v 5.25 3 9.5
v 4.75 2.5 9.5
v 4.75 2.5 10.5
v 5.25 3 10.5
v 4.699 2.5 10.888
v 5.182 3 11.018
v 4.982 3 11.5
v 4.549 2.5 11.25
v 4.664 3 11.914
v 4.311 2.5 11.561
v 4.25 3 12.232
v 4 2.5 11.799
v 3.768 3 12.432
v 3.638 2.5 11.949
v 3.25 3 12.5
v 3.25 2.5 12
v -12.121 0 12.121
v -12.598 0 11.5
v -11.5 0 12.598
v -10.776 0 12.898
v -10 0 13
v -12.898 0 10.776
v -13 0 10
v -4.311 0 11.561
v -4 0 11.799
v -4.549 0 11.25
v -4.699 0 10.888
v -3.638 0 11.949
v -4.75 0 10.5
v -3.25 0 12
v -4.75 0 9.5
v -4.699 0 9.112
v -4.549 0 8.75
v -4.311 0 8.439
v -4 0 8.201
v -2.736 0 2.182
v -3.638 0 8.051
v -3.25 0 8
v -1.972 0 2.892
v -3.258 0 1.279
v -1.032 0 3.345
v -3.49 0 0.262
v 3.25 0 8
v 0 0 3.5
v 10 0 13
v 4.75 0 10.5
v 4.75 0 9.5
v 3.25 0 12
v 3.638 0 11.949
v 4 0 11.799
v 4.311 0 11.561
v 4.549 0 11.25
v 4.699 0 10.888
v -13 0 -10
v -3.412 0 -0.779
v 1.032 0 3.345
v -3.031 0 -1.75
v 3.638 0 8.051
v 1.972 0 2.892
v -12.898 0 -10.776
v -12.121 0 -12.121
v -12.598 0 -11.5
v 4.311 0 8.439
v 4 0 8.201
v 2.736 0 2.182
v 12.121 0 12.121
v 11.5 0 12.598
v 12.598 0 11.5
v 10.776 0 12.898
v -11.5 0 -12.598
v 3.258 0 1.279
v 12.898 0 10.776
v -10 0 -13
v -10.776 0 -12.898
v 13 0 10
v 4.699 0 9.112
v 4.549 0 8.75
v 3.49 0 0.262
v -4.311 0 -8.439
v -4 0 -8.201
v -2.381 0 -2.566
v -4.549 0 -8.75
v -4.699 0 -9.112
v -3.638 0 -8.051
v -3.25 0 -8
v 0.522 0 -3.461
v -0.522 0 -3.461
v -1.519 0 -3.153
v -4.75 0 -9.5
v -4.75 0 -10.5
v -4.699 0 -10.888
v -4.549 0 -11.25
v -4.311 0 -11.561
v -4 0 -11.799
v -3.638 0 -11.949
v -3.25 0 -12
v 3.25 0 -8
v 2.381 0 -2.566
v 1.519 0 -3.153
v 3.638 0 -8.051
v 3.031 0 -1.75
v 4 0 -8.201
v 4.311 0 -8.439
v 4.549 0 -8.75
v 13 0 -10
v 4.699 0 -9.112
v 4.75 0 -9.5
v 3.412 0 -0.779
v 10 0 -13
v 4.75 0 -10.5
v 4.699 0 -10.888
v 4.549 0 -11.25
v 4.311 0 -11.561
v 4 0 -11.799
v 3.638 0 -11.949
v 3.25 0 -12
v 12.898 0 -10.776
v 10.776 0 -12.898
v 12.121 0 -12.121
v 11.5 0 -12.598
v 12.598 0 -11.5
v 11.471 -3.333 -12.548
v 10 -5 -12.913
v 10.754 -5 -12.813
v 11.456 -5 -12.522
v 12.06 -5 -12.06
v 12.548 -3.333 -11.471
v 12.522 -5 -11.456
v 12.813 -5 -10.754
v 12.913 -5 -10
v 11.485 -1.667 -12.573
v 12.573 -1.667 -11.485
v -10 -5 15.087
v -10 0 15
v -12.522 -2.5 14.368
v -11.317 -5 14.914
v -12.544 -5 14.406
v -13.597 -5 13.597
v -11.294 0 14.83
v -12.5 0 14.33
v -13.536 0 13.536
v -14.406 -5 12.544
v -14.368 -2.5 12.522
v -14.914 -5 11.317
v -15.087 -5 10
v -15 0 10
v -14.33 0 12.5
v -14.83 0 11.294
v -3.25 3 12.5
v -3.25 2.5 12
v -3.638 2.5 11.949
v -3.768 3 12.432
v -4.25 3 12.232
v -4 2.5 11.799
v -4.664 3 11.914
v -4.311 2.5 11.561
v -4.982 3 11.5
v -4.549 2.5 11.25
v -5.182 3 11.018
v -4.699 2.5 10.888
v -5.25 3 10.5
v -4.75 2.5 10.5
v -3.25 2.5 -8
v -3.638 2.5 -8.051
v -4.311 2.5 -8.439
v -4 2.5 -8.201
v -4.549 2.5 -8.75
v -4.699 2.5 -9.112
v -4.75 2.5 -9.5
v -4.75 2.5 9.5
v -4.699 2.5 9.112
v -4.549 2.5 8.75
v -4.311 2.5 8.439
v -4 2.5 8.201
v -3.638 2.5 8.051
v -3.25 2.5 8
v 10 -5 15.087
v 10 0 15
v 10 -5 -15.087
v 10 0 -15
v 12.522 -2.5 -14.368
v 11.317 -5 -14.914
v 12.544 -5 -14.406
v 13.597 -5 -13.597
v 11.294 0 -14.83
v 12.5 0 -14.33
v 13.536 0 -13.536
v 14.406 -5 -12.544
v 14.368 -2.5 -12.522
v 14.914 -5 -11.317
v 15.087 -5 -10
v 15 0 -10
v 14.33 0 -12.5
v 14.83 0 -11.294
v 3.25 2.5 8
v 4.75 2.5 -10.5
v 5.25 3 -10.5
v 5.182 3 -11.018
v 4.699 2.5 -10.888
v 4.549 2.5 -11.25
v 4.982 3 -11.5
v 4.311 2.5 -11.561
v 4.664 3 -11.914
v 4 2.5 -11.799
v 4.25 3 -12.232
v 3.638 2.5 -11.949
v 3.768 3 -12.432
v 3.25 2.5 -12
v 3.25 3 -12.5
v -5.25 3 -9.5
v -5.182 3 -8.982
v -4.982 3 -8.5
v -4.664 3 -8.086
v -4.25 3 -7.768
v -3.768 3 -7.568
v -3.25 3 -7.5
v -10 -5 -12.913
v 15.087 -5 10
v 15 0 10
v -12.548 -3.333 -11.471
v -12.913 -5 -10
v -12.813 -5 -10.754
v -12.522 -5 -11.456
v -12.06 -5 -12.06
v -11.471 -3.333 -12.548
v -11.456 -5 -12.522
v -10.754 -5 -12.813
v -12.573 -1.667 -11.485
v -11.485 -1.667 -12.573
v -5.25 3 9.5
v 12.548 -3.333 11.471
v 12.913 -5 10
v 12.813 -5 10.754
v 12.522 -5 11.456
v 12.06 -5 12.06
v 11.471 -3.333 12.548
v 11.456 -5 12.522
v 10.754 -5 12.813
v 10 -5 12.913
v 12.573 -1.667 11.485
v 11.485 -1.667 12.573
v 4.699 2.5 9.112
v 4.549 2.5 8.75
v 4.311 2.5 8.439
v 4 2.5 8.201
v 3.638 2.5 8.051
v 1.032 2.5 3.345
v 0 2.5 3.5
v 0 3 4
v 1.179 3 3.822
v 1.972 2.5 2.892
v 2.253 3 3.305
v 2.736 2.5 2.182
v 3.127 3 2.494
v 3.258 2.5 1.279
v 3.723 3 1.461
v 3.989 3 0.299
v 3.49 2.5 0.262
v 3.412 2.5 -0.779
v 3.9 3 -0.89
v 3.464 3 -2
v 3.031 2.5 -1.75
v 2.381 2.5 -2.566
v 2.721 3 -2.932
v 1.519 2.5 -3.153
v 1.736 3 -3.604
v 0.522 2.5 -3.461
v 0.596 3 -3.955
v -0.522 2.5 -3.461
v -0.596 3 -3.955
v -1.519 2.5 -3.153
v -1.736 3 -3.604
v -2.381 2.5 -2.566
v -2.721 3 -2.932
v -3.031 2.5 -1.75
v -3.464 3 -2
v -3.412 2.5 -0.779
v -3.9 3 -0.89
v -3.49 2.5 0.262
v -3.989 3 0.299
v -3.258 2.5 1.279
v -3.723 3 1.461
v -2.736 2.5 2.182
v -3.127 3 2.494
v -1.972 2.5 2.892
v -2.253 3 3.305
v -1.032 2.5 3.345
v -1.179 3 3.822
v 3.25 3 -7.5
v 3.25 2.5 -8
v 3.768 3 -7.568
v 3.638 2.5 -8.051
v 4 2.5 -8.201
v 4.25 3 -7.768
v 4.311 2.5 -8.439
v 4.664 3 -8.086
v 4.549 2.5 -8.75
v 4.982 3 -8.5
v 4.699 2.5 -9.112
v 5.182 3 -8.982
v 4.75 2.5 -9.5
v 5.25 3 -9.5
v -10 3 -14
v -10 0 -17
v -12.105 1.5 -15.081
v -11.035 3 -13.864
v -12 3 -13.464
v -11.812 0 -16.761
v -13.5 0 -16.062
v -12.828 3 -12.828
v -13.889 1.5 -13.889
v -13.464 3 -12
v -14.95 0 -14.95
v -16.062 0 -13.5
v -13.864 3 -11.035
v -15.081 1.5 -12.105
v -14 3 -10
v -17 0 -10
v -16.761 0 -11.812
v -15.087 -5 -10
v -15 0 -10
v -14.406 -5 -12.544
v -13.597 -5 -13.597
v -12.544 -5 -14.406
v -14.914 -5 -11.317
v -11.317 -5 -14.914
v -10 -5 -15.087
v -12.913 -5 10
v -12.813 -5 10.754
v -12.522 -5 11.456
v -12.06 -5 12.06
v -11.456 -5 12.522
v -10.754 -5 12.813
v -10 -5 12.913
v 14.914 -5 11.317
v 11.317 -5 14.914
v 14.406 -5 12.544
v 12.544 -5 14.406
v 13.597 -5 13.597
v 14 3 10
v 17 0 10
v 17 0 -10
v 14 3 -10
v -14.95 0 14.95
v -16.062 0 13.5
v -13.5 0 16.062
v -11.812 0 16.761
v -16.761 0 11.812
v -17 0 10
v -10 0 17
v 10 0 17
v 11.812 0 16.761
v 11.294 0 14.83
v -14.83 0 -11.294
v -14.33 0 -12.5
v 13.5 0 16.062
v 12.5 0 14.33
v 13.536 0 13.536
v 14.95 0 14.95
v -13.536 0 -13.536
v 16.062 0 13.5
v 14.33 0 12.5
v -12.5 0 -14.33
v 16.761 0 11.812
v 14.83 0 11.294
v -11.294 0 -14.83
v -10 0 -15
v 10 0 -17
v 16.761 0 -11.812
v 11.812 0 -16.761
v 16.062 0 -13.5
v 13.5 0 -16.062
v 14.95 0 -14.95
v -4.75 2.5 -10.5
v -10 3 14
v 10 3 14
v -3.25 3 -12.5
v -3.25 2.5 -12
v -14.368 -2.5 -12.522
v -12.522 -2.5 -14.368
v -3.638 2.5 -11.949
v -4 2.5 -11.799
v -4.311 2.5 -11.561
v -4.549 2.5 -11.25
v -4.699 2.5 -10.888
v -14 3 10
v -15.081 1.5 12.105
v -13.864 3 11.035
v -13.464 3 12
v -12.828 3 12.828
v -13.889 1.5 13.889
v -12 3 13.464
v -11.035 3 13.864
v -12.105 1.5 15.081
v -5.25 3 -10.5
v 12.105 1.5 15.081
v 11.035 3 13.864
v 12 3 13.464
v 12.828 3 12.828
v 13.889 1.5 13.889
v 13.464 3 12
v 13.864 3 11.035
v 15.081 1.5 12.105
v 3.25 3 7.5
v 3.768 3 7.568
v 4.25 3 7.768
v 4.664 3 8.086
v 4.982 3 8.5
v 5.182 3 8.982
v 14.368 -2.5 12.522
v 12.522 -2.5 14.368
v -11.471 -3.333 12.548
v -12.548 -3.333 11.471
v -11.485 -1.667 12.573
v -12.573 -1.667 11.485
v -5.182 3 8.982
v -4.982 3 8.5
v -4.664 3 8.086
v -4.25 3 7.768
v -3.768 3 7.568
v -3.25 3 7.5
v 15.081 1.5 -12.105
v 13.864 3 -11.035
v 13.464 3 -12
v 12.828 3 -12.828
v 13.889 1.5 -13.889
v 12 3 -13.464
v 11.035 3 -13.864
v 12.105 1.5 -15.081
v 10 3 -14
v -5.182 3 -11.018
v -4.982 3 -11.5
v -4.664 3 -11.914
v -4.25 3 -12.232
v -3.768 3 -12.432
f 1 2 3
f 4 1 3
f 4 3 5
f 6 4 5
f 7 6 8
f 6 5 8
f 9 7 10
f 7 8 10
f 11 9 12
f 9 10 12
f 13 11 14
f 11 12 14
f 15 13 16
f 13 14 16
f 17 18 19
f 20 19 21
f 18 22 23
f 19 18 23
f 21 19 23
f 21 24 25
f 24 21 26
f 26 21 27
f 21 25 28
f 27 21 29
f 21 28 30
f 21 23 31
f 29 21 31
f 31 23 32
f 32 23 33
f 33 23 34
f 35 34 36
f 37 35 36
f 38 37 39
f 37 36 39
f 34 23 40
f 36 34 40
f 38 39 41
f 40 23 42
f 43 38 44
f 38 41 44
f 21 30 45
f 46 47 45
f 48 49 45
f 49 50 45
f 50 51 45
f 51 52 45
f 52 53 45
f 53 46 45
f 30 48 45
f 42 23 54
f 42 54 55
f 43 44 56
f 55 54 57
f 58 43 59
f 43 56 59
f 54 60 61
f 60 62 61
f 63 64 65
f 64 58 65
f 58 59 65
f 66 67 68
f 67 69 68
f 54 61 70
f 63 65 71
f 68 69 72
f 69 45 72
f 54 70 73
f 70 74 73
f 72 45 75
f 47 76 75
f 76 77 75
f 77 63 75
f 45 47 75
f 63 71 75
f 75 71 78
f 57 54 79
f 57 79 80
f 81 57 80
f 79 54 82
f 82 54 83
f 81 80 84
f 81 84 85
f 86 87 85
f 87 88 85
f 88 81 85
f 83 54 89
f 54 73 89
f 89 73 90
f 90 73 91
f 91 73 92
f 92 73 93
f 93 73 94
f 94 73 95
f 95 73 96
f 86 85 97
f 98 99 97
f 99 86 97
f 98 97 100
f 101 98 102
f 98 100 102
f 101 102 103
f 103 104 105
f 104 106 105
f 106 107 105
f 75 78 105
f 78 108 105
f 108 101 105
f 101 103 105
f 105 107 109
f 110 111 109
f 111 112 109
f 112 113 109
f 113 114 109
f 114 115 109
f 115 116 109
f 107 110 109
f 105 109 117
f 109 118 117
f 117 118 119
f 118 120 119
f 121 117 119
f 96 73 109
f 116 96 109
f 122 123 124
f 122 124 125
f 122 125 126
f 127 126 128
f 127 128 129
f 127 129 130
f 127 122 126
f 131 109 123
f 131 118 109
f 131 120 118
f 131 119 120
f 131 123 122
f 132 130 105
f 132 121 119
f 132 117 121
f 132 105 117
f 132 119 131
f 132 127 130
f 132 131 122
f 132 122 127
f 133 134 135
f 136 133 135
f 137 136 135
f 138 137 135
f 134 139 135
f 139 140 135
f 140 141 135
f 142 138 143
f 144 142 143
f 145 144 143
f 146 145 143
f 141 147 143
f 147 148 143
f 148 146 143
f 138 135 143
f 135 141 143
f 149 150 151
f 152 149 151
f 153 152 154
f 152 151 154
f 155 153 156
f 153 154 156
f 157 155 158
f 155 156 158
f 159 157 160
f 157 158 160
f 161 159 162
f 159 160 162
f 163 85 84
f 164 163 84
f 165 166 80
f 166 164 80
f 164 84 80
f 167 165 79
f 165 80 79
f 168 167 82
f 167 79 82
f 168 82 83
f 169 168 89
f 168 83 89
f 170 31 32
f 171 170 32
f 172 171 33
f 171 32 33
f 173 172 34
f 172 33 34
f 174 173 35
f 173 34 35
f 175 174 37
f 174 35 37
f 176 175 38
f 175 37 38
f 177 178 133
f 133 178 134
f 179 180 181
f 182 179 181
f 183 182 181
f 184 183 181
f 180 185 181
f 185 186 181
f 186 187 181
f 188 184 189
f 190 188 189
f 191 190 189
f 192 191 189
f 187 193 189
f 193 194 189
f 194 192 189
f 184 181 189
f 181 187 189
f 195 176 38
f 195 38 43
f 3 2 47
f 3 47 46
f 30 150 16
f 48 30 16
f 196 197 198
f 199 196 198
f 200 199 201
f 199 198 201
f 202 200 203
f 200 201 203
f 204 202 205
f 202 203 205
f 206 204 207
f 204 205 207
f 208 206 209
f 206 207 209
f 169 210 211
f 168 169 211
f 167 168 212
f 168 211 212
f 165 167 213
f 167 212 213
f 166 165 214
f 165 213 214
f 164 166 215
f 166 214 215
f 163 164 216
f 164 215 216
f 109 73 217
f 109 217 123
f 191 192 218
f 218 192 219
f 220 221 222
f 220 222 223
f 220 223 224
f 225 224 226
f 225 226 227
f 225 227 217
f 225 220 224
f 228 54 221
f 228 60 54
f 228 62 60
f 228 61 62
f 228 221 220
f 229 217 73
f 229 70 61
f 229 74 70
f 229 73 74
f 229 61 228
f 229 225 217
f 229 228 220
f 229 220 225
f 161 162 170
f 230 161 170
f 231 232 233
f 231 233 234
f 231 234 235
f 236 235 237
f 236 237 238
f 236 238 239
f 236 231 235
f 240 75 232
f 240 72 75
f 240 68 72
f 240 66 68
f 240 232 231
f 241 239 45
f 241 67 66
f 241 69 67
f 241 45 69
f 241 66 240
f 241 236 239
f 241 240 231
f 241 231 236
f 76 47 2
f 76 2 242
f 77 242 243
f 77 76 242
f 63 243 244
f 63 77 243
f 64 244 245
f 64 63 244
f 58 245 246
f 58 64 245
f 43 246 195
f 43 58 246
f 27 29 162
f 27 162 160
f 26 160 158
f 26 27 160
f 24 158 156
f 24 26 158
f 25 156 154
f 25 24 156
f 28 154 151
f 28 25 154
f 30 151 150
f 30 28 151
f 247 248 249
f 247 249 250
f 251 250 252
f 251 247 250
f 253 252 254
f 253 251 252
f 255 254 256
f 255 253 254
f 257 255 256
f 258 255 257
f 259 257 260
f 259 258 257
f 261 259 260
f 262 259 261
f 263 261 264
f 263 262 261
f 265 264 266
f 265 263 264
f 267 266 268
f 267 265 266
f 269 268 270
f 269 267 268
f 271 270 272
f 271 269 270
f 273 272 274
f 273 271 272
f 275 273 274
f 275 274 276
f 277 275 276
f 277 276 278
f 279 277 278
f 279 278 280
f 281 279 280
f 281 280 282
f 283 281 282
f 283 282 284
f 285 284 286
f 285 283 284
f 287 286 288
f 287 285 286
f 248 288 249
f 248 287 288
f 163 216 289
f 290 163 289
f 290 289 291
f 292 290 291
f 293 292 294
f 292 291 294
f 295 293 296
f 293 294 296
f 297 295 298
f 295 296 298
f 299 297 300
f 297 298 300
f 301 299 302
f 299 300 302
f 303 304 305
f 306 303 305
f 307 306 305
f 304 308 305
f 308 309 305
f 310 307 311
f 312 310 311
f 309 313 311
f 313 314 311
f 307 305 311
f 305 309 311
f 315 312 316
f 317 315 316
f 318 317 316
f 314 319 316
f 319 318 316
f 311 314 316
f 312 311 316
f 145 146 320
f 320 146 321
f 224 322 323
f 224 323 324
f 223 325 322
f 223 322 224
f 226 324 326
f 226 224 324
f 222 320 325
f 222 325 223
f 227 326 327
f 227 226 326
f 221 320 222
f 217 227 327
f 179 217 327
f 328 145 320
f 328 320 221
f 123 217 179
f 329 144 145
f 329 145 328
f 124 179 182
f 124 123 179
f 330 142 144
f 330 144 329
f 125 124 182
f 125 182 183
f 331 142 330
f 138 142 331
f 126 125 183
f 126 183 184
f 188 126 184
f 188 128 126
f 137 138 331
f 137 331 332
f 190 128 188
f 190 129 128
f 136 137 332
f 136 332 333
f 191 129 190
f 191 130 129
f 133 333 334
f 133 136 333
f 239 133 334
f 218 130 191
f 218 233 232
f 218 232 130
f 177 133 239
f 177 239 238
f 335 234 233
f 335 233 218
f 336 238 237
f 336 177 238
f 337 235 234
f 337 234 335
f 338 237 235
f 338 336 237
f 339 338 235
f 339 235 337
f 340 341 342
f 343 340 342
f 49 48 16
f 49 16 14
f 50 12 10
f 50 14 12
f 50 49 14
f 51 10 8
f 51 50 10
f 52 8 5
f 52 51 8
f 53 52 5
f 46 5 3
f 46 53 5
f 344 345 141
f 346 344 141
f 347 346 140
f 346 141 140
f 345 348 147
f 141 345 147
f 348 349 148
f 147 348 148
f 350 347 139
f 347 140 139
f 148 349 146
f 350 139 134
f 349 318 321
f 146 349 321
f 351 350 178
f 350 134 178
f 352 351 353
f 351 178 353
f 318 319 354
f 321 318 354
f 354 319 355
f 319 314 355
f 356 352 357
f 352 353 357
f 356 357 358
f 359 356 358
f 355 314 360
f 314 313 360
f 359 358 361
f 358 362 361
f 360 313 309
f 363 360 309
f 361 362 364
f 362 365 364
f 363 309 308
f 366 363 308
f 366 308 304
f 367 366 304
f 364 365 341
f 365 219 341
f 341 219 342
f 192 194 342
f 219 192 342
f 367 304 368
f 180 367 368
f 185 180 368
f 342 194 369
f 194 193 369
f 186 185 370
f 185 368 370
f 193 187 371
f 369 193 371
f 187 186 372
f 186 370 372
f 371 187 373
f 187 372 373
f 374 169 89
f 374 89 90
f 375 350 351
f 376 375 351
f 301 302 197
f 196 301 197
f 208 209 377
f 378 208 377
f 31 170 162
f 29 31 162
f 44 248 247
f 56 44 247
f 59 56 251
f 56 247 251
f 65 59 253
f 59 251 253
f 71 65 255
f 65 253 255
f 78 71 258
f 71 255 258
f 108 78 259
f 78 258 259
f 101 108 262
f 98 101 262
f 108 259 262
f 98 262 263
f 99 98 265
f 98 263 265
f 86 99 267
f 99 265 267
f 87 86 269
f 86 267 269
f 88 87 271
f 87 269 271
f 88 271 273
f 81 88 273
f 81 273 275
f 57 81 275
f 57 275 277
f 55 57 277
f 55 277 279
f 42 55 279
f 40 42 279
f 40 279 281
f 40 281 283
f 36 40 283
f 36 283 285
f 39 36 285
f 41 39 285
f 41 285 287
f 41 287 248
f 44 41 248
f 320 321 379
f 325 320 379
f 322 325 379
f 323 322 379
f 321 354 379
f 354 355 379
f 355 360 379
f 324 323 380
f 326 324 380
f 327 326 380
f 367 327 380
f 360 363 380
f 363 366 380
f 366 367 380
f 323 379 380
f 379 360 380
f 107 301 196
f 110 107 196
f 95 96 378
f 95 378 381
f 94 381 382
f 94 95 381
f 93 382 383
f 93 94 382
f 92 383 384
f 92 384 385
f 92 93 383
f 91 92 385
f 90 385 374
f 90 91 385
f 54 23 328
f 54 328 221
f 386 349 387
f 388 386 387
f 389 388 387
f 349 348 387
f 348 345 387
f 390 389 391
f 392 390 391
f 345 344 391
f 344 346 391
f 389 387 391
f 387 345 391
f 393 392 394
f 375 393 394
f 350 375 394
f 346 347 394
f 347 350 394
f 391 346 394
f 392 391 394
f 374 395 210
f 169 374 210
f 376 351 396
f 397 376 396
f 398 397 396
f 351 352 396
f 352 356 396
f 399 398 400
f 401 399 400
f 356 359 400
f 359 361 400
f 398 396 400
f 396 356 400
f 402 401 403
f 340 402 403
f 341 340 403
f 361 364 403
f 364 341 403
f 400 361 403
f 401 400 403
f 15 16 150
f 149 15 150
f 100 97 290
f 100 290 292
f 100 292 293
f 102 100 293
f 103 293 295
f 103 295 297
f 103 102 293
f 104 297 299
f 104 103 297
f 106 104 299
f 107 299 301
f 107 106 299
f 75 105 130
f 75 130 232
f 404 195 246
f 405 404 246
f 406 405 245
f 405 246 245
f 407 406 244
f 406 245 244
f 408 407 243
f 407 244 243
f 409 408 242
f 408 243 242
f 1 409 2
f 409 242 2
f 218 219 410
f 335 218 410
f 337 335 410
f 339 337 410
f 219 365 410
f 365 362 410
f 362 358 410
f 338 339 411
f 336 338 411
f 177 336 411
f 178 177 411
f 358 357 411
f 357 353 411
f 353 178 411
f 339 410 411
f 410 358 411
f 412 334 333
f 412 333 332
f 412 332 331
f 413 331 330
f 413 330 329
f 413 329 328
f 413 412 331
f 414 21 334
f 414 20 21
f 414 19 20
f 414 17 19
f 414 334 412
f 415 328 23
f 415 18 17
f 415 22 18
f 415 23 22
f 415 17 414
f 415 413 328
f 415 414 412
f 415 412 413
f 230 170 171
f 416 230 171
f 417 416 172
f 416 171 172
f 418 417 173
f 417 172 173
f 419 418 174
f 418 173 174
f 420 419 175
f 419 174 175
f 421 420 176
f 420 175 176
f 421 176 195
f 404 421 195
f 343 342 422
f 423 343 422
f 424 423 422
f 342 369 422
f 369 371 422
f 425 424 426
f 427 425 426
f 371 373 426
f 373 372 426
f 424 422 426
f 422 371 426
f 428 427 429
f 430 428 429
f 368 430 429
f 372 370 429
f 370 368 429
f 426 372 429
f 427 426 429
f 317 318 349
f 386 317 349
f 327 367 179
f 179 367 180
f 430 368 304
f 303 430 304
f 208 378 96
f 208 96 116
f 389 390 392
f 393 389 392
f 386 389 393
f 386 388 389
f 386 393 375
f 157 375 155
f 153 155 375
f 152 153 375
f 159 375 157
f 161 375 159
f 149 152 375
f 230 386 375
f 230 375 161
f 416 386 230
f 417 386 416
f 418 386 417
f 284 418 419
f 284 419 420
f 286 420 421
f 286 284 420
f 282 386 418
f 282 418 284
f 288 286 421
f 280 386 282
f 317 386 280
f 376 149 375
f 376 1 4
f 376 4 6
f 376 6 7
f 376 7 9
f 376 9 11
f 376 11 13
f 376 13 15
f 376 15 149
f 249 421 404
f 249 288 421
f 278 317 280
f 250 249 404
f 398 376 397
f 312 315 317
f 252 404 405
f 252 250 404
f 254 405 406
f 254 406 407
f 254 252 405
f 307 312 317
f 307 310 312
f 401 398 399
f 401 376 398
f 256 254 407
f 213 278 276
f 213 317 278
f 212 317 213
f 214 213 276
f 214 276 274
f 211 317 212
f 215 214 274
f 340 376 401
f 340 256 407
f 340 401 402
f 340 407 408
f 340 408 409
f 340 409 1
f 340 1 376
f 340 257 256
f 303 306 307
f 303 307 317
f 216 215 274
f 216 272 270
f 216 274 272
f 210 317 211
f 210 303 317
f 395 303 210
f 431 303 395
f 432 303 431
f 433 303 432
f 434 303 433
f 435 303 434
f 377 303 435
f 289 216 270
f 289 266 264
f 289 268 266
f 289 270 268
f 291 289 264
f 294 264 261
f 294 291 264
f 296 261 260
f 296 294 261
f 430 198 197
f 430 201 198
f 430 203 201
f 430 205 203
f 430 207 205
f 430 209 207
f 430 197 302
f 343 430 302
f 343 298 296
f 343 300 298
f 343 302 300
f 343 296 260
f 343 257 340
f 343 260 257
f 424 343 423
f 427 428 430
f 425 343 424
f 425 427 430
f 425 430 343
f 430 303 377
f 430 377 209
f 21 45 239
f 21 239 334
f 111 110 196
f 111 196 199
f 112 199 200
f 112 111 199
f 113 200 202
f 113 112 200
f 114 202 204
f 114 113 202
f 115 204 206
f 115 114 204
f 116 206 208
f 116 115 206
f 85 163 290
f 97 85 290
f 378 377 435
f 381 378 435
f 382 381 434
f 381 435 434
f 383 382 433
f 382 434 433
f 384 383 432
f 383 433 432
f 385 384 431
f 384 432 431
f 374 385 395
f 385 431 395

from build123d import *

# Parameters (mm, degrees)
CROQUIS1_W                 = 34
CROQUIS1_H                 = 34
SALIENTE_EXTRUIR1_DEPTH    = 3
REDONDEO1_R                = 7
CHAFL_N1_SIZE              = 3
CROQUIS2_W                 = 9.5
CROQUIS2_H                 = 4
CORTAR_EXTRUIR1_DEPTH      = 25.228082879
REDONDEO2_R                = 1.5
CHAFL_N2_SIZE              = 0.5
SALIENTE_EXTRUIR2_DEPTH    = 5
SALIENTE_EXTRUIR2_DRAFT    = -1
CROQUIS9_R                 = 3.5
CORTAR_EXTRUIR2_DEPTH      = 26.337718919
CHAFL_N3_SIZE              = 0.5
REDONDEO2_OF_SIMETR_A1_R   = 1.5
CHAFL_N2_OF_SIMETR_A1_SIZE = 0.5


with BuildPart() as part:
    # Croquis1 → Saliente-Extruir1 (new body)
    with BuildSketch(Plane(origin=(0, 0, 0), x_dir=(1, 0, 0), z_dir=(0, 1, 0))):
        Rectangle(CROQUIS1_W, CROQUIS1_H)
    extrude(amount=SALIENTE_EXTRUIR1_DEPTH)

    # Redondeo1
    redondeo1_edges = [part.edges().sort_by_distance(p)[0] for p in [
        (17, 1.5, 17),
        (-17, 1.5, 17),
        (-17, 1.5, -17),
        (17, 1.5, -17),
    ]]
    fillet(redondeo1_edges, radius=REDONDEO1_R)

    # Chaflán1
    chafl_n1_edges = [part.edges().sort_by_distance(p)[0] for p in [
        (17, 3, 0),
        (14.949747468, 3, -14.949747468),
        (14.949747468, 3, 14.949747468),
        (0, 3, -17),
        (0, 3, 17),
        (-14.949747468, 3, -14.949747468),
        (-14.949747468, 3, 14.949747468),
        (-17, 3, 0),
    ]]
    chamfer(chafl_n1_edges, length=CHAFL_N1_SIZE - 0.0001)  # a hair under: the kernel refuses the full size

    # Croquis2 → Cortar-Extruir1 (cut, through all)
    with BuildSketch(Plane(origin=(0, 3, 0), x_dir=(1, 0, 0), z_dir=(0, 1, 0))):
        with Locations((0, 10)):
            Rectangle(CROQUIS2_W, CROQUIS2_H)
    cortar_extruir1 = extrude(amount=-CORTAR_EXTRUIR1_DEPTH, mode=Mode.SUBTRACT)

    # Redondeo2
    redondeo2_edges = [part.edges().sort_by_distance(p)[0] for p in [
        (4.75, 1.5, -12),
        (4.75, 1.5, -8),
        (-4.75, 1.5, -8),
        (-4.75, 1.5, -12),
    ]]
    fillet(redondeo2_edges, radius=REDONDEO2_R)

    # Chaflán2
    chafl_n2_edges = [part.edges().sort_by_distance(p)[0] for p in [
        (0, 3, -8),
        (-4.75, 3, -10),
        (4.75, 3, -10),
        (0, 3, -12),
        (-4.310660172, 3, -8.439339828),
        (4.310660172, 3, -8.439339828),
        (4.310660172, 3, -11.560660172),
        (-4.310660172, 3, -11.560660172),
    ]]
    chamfer(chafl_n2_edges, length=CHAFL_N2_SIZE)


with BuildPart() as saliente_extruir2_tool:
    # Croquis8 → Saliente-Extruir2 (with draft: the straight prism first)
    with BuildSketch(Plane.XZ):
        with BuildLine():
            ThreePointArc((-10, 15), (-13.535533906, 13.535533906), (-15, 10))
            Line((-15, 10), (-15, -10))
            ThreePointArc((-15, -10), (-13.535533906, -13.535533906), (-10, -15))
            Line((-10, -15), (10, -15))
            ThreePointArc((10, -15), (13.535533906, -13.535533906), (15, -10))
            Line((15, -10), (15, 10))
            ThreePointArc((15, 10), (13.535533906, 13.535533906), (10, 15))
            Line((10, 15), (-10, 15))
        make_face()
        with BuildLine():
            Line((-13, 10), (-13, -10))
            ThreePointArc((-13, -10), (-12.121320344, -12.121320344), (-10, -13))
            Line((-10, -13), (10, -13))
            ThreePointArc((10, -13), (12.121320344, -12.121320344), (13, -10))
            Line((13, -10), (13, 10))
            ThreePointArc((13, 10), (12.121320344, 12.121320344), (10, 13))
            Line((10, 13), (-10, 13))
            ThreePointArc((-10, 13), (-12.121320344, 12.121320344), (-13, 10))
        make_face(mode=Mode.SUBTRACT)
    extrude(amount=SALIENTE_EXTRUIR2_DEPTH)
    # Saliente-Extruir2: the draft: its side faces are tilted about the plane it starts from
    saliente_extruir2_sides = [saliente_extruir2_tool.faces().sort_by_distance(p)[0] for p in [
        (0, -2.5, 15),
        (-13.535533906, -2.5, 13.535533906),
        (-15, -2.5, 0),
        (-13.535533906, -2.5, -13.535533906),
        (0, -2.5, -15),
        (13.535533906, -2.5, -13.535533906),
        (15, -2.5, 0),
        (13.535533906, -2.5, 13.535533906),
        (12.121320344, -2.5, 12.121320344),
        (13, -2.5, 0),
        (12.121320344, -2.5, -12.121320344),
        (0, -2.5, -13),
        (-12.121320344, -2.5, -12.121320344),
        (-13, -2.5, 0),
        (-12.121320344, -2.5, 12.121320344),
        (0, -2.5, 13),
    ]]
    draft(saliente_extruir2_sides, Plane.XZ, SALIENTE_EXTRUIR2_DRAFT)


with BuildPart() as part_1:
    add(part.part)

    # Saliente-Extruir2: add saliente_extruir2_tool
    add(saliente_extruir2_tool.part)

    # Croquis9 → Cortar-Extruir2 (cut, through all)
    with BuildSketch(Plane(origin=(0, 3, 0), x_dir=(1, 0, 0), z_dir=(0, 1, 0))):
        with Locations(Location((0, 0, 0), (0, 0, 270))):
            Circle(CROQUIS9_R)
    extrude(amount=-CORTAR_EXTRUIR2_DEPTH, mode=Mode.SUBTRACT)

    # Chaflán3
    chafl_n3_edges = [part_1.edges().sort_by_distance(p)[0] for p in [
        (0, 3, -3.5),
    ]]
    chamfer(chafl_n3_edges, length=CHAFL_N3_SIZE)

    # Simetría1: Cortar-Extruir1 across plane
    add(cortar_extruir1.mirror(Plane.XY), mode=Mode.SUBTRACT)

    # Redondeo2 of Simetría1
    redondeo2_of_simetr_a1_edges = [part_1.edges().sort_by_distance(p)[0] for p in [
        (4.75, 1.5, 12),
        (4.75, 1.5, 8),
        (-4.75, 1.5, 8),
        (-4.75, 1.5, 12),
    ]]
    fillet(redondeo2_of_simetr_a1_edges, radius=REDONDEO2_OF_SIMETR_A1_R)

    # Chaflán2 of Simetría1
    chafl_n2_of_simetr_a1_edges = [part_1.edges().sort_by_distance(p)[0] for p in [
        (0, 3, 8),
        (-4.75, 3, 10),
        (4.75, 3, 10),
        (0, 3, 12),
        (-4.310660172, 3, 8.439339828),
        (4.310660172, 3, 8.439339828),
        (4.310660172, 3, 11.560660172),
        (-4.310660172, 3, 11.560660172),
    ]]
    chamfer(chafl_n2_of_simetr_a1_edges, length=CHAFL_N2_OF_SIMETR_A1_SIZE)


solid = part_1.part
